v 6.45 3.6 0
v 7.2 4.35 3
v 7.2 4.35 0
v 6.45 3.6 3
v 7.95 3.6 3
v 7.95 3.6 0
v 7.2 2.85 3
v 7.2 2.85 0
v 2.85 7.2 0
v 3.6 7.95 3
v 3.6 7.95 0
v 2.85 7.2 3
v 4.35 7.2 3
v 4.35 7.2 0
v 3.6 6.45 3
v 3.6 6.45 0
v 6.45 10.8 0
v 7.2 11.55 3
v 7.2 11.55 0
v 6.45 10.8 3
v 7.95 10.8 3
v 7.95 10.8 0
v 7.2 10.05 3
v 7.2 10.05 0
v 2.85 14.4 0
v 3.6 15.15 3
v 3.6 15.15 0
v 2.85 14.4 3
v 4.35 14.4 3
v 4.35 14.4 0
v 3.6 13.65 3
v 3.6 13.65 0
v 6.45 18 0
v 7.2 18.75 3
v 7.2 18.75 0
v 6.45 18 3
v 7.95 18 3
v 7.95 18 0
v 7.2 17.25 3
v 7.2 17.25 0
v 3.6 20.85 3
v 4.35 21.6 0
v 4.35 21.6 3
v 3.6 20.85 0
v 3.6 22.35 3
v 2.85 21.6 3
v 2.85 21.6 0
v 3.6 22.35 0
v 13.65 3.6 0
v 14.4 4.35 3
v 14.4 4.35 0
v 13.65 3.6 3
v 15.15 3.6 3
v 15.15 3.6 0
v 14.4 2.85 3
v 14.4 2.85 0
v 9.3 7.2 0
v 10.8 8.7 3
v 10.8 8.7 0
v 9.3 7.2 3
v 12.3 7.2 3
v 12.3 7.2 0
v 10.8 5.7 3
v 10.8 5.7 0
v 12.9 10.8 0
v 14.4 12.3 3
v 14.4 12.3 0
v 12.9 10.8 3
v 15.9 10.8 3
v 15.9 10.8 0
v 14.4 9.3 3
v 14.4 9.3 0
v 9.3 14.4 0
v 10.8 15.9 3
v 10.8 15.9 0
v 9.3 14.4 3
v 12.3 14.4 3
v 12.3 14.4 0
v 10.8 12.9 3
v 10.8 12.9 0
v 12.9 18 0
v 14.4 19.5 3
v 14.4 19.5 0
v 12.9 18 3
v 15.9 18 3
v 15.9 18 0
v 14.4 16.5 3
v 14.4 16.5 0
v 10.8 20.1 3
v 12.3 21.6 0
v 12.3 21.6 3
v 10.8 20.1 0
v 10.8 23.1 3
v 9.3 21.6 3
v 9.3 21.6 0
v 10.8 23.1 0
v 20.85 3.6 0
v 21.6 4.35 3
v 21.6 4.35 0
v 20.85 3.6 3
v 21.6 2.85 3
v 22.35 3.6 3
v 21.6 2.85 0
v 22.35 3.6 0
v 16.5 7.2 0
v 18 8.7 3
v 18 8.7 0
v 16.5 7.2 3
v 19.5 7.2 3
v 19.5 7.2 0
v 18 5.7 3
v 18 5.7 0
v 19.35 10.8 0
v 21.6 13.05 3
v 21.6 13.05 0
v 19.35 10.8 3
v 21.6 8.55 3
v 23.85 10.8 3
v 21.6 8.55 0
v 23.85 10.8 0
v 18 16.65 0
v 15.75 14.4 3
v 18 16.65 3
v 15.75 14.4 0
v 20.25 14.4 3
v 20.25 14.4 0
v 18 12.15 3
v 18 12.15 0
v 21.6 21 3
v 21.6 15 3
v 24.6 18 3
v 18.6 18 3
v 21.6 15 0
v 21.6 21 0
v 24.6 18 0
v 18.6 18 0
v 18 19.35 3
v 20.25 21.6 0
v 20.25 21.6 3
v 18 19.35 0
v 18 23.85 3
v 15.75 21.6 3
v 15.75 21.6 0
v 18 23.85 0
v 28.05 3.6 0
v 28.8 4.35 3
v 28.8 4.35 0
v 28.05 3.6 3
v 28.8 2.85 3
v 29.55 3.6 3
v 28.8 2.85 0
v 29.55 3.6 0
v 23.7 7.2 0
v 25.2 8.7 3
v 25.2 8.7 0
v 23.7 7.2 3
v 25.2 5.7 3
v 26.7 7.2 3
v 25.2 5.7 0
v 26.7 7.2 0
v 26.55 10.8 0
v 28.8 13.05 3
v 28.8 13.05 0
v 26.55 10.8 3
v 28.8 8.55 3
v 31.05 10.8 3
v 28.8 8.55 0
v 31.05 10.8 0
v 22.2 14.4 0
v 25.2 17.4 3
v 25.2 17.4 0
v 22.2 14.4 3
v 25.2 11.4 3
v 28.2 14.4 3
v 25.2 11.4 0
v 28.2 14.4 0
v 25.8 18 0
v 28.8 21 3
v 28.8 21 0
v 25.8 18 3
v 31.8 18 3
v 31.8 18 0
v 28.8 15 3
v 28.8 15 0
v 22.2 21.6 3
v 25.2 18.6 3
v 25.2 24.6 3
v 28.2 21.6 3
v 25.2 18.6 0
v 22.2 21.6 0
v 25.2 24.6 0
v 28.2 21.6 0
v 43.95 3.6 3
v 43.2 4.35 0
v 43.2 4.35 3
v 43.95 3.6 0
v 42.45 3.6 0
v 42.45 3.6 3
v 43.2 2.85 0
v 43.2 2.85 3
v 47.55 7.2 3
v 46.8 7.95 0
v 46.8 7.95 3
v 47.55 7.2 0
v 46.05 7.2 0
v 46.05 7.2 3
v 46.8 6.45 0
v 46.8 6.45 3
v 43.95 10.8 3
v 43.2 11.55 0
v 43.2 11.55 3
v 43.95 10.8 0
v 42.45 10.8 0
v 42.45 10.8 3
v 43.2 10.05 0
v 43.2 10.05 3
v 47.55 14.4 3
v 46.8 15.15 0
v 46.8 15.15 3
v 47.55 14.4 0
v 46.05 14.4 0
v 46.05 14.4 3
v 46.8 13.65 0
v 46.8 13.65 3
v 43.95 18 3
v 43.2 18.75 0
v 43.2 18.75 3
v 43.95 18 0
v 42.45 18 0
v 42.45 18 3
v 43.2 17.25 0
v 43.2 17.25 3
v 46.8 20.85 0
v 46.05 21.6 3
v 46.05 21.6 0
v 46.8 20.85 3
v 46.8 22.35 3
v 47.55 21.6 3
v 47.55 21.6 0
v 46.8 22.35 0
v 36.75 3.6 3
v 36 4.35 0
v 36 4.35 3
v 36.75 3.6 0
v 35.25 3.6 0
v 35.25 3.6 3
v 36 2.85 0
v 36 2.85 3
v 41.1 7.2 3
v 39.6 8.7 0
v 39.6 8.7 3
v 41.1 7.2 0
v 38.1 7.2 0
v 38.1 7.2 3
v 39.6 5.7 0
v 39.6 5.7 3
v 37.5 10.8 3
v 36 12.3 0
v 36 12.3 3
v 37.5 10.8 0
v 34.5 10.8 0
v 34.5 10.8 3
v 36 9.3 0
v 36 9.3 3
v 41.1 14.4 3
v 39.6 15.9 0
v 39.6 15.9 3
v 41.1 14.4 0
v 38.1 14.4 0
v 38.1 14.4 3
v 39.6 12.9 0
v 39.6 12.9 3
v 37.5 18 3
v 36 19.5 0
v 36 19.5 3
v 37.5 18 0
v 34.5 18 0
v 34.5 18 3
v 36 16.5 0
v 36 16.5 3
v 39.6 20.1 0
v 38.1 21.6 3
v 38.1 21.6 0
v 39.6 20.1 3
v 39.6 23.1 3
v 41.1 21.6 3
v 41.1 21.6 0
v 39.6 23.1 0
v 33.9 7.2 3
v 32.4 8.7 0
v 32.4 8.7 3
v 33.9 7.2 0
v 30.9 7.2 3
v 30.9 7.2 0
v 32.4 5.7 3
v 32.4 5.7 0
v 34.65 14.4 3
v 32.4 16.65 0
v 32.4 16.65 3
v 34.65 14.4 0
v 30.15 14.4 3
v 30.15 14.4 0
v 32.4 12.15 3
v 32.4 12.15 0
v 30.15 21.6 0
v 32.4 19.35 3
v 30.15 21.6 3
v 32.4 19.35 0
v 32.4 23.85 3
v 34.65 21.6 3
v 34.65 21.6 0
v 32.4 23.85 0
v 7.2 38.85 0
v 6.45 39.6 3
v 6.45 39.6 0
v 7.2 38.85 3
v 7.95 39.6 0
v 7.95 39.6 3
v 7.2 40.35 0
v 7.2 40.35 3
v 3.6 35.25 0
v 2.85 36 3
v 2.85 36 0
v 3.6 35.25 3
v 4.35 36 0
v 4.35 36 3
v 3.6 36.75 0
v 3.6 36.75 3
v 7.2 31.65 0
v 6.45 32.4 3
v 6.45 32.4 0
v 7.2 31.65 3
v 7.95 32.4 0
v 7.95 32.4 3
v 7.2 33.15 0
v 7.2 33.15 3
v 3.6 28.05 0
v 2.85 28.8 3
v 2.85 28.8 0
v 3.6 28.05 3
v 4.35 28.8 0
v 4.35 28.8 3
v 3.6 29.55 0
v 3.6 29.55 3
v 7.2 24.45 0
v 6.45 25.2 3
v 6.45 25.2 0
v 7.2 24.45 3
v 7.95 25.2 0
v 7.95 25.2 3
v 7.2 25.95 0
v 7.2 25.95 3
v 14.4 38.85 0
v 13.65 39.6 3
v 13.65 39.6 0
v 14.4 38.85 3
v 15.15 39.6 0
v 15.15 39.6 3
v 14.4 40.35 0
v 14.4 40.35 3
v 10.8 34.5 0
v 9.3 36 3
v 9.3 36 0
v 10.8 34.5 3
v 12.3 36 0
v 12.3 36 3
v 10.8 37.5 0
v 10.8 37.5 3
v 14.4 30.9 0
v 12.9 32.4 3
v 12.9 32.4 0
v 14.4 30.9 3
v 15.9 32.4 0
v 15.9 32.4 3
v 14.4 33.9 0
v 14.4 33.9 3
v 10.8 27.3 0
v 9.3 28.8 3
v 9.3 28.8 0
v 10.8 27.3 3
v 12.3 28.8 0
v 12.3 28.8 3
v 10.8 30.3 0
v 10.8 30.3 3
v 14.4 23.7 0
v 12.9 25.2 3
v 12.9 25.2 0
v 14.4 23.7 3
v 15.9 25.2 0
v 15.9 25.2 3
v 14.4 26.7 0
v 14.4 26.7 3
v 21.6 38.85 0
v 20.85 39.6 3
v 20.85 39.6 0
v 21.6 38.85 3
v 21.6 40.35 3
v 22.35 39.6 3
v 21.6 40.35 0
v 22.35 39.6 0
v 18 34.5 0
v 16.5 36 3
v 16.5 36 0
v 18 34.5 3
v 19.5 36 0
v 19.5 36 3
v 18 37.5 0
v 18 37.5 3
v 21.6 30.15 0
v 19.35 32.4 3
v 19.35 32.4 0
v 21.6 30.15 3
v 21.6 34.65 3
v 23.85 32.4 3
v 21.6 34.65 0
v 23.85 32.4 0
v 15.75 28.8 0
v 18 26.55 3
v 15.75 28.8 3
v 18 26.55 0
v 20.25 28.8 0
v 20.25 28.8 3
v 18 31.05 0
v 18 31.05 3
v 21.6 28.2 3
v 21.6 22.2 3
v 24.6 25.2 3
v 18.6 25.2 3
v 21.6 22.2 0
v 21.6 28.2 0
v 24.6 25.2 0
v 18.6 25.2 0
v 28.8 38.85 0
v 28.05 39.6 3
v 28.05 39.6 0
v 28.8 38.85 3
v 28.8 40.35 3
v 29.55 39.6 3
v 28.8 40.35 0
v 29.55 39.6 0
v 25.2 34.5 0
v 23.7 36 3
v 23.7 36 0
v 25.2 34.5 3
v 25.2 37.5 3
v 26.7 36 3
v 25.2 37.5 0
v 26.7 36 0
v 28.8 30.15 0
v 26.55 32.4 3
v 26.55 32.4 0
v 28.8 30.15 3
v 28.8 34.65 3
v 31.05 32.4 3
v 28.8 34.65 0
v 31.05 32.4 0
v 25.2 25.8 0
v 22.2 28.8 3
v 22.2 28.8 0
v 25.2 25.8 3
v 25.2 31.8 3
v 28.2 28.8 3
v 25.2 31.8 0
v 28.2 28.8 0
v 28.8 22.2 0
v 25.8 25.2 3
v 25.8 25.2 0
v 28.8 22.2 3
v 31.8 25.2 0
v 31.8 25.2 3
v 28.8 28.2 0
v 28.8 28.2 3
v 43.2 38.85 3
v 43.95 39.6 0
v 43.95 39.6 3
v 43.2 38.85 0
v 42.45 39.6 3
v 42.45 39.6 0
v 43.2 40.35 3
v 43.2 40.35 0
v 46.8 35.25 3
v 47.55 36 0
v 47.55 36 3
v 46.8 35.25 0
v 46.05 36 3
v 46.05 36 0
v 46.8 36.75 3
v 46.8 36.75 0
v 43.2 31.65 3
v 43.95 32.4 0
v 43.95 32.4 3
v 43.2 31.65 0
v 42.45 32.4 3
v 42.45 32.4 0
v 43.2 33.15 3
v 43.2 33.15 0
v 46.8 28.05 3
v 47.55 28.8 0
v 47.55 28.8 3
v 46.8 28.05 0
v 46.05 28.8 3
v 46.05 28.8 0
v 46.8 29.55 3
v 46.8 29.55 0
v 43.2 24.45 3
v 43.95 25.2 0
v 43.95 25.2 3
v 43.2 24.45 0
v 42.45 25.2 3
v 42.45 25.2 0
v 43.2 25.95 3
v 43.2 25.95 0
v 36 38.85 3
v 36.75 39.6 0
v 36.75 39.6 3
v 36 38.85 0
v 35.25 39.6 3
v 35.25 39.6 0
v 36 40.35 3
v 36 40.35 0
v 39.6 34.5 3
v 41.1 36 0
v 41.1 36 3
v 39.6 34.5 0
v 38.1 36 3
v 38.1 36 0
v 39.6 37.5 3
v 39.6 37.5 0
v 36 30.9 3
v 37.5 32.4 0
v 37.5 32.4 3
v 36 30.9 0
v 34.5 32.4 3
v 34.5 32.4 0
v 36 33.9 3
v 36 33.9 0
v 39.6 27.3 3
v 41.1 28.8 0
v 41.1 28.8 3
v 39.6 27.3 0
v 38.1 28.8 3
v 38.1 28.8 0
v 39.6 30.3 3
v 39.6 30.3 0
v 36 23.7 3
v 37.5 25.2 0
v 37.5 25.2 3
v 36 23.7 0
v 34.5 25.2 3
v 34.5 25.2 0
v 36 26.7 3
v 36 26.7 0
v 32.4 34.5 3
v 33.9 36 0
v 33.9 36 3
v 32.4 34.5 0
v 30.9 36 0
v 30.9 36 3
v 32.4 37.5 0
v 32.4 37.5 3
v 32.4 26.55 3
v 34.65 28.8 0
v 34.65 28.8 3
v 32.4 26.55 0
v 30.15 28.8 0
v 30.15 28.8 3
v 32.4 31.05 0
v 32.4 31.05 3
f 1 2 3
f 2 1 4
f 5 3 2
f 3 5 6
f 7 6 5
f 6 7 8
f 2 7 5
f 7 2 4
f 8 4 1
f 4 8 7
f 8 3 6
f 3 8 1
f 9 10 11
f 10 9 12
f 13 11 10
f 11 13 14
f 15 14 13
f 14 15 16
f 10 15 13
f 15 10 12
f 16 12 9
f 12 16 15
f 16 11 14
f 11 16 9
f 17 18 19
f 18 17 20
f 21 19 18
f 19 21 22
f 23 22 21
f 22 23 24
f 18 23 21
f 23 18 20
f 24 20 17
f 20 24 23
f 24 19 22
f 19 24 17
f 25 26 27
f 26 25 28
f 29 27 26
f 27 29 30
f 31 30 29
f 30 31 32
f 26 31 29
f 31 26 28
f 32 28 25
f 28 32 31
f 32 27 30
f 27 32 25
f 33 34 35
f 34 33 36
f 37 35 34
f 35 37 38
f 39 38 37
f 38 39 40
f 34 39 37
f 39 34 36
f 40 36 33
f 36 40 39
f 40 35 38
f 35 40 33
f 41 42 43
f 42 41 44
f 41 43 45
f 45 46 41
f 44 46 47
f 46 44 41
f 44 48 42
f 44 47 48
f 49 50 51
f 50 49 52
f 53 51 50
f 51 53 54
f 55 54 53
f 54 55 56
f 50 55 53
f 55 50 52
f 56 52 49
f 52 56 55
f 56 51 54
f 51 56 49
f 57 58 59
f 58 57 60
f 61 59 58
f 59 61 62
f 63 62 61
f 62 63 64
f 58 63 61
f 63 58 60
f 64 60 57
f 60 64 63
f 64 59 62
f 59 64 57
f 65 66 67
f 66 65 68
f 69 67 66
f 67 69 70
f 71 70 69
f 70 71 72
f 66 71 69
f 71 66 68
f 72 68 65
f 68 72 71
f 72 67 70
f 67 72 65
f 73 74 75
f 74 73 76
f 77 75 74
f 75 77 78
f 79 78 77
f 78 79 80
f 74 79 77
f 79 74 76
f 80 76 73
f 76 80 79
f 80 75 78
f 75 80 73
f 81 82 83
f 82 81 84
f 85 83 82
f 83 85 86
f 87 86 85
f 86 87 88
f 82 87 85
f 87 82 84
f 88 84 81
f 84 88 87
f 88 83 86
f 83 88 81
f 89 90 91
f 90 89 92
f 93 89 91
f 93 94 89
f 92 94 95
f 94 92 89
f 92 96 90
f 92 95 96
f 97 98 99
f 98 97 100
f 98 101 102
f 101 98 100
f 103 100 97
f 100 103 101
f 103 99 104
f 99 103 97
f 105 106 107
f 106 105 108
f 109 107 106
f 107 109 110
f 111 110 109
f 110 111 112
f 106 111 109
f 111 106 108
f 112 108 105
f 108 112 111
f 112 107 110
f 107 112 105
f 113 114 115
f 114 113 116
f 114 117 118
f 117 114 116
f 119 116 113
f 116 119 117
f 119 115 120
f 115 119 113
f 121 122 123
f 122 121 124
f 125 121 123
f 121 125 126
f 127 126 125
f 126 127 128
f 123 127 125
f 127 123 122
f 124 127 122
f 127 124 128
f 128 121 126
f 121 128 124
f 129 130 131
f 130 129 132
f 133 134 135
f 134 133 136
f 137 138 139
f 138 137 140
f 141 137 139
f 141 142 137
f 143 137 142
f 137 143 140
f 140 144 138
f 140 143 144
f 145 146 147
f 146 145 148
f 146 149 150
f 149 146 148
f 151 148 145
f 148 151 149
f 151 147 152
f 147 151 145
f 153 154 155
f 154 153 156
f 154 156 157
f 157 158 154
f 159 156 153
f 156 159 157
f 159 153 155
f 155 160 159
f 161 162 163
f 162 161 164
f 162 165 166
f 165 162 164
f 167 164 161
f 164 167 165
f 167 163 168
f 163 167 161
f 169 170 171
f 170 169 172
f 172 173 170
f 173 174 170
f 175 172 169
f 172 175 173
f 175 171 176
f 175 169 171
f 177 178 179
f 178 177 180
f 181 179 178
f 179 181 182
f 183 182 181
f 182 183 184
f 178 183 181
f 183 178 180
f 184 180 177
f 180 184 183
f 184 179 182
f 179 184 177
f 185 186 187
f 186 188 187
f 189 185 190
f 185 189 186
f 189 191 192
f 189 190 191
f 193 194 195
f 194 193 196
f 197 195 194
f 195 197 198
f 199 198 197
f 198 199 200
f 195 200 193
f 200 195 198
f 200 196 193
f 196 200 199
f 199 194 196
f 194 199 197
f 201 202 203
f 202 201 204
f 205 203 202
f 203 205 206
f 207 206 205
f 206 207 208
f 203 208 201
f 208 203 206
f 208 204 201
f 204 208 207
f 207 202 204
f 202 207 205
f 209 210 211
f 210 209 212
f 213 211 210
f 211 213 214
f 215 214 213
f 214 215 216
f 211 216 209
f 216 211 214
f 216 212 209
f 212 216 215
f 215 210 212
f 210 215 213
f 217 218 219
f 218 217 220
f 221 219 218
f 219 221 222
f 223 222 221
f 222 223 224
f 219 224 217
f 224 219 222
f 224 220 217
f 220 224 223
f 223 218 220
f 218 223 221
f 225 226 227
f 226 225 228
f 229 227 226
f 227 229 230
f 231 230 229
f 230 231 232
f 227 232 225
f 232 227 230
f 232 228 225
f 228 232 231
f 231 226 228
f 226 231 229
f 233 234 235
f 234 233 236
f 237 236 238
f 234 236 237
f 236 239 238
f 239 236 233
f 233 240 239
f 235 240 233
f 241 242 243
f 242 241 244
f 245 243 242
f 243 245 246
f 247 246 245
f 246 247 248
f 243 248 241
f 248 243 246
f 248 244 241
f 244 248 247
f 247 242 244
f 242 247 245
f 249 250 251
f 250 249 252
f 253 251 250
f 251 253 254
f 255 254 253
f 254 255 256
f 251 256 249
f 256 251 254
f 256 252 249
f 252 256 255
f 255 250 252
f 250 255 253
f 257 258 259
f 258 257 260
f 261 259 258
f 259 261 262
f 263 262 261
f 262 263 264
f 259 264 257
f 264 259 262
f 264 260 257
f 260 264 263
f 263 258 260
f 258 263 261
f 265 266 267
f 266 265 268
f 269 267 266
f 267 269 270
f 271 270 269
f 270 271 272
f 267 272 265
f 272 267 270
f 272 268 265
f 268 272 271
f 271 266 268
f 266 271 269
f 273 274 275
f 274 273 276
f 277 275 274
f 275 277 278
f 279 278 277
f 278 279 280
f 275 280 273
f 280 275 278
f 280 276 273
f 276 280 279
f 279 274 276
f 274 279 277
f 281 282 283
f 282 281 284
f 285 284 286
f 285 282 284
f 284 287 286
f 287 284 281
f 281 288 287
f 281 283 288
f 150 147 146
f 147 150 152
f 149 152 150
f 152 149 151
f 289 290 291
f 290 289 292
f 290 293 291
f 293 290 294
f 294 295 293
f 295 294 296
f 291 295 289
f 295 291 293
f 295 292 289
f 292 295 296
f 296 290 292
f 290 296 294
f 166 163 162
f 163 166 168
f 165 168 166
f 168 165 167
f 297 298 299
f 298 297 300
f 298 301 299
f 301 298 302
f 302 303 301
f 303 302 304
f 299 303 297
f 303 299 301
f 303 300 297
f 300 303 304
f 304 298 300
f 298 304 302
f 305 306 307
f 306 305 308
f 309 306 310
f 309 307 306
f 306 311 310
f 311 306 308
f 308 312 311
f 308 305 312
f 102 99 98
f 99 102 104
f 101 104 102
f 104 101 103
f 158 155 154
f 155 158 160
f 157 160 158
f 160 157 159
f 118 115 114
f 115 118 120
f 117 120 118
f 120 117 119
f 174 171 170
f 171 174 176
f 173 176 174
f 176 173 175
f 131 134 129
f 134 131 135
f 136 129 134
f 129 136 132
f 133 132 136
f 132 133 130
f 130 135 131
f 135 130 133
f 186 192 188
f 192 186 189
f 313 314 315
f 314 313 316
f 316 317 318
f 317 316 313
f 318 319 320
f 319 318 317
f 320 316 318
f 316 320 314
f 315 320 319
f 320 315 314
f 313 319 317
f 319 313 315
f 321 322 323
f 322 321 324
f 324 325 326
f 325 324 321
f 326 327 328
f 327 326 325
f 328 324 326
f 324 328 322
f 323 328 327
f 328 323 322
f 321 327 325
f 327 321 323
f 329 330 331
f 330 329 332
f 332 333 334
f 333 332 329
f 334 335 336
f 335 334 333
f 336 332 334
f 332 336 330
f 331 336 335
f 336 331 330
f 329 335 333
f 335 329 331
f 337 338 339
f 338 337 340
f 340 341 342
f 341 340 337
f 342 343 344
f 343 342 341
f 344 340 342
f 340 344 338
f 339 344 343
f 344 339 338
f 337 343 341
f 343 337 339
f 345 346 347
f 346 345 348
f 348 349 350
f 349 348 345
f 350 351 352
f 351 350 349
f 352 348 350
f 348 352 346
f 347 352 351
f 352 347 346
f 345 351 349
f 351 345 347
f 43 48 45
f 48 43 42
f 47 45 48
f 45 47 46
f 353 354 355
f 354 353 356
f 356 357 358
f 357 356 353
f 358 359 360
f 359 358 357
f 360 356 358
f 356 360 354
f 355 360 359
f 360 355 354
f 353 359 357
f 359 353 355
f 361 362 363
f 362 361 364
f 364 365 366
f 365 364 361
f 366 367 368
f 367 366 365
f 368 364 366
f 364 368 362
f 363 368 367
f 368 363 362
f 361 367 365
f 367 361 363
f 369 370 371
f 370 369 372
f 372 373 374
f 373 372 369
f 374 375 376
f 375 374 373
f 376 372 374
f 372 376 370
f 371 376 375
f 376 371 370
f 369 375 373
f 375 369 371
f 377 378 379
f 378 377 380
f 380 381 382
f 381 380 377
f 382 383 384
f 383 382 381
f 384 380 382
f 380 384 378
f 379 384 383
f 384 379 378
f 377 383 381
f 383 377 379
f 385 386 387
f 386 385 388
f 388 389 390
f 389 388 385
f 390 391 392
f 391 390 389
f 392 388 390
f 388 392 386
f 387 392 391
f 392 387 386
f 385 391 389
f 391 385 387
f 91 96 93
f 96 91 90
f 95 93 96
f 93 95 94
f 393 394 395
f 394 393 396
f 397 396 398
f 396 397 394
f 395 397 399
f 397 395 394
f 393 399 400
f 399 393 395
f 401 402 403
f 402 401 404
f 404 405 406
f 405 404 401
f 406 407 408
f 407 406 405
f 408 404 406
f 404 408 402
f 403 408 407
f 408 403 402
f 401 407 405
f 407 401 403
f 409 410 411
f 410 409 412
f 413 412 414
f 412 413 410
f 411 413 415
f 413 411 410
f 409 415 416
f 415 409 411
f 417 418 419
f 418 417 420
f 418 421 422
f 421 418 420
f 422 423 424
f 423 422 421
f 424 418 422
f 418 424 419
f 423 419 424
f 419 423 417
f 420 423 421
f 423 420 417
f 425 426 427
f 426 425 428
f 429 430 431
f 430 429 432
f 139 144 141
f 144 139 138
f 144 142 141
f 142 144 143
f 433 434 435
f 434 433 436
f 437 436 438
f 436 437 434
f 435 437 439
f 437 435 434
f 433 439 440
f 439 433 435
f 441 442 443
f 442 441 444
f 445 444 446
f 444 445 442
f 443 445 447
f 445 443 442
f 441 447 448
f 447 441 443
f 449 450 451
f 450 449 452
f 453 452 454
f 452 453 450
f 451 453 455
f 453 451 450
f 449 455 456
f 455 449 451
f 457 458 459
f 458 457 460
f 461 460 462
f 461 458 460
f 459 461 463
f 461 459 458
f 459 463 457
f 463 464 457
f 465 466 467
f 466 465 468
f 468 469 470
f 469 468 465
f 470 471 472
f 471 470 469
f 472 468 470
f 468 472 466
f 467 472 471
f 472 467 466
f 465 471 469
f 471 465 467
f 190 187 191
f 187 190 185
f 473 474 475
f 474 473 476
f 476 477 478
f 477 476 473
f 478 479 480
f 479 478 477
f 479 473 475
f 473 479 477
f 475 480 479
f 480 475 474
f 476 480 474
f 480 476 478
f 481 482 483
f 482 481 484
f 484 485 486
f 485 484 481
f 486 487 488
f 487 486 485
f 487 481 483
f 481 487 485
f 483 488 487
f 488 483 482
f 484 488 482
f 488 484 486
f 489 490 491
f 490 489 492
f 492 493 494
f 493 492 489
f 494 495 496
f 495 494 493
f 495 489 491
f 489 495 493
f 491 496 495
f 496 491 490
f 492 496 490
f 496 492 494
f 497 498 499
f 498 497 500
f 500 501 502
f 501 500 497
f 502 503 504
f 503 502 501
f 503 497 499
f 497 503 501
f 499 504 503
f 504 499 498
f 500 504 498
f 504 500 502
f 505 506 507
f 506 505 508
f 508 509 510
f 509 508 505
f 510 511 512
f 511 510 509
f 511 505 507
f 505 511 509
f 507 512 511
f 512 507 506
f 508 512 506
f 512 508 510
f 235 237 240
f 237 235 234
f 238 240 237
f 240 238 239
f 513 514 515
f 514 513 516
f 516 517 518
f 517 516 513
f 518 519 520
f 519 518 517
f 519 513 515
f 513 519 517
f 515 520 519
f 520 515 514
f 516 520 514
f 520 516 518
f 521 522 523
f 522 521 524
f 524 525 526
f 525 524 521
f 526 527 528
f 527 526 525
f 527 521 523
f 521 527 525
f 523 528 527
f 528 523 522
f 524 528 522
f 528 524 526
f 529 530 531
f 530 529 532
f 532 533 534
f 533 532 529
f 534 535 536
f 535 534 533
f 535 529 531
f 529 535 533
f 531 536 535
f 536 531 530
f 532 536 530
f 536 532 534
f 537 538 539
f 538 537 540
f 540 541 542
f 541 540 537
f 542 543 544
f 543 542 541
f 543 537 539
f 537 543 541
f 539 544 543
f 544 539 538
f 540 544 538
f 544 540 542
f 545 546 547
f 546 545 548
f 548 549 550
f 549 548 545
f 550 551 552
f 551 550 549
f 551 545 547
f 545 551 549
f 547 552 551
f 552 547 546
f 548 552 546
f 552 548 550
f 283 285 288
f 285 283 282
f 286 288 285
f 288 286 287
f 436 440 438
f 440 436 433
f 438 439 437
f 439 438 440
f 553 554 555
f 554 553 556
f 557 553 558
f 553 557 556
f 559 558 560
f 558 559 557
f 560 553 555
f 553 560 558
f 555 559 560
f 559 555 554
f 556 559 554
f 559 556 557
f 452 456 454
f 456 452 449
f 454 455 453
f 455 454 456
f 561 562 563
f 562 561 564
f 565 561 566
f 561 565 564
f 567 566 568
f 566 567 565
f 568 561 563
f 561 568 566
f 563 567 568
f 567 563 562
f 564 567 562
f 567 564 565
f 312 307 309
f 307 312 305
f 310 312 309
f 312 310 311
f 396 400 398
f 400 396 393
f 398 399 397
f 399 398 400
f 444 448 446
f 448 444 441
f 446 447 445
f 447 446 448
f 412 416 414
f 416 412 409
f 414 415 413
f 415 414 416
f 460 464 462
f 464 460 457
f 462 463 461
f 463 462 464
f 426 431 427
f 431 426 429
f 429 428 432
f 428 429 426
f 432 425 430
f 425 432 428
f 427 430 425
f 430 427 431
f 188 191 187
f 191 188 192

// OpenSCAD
// parameters
NUM_X = 4;
NUM_Y = 6;
H = 3;
R_HOLE_MAX = 3;

module DiamondColumnsCorner(num_x, num_y, h, r_hole_max) {
    num_min = min(num_x, num_y);
    for ( i = [1 : num_x] ) {
        for ( j = [1 : num_y] ) {
            r = r_hole_max * (1.0/num_min)*min(i, j);
            if (r > r_hole_max) {
                r = r_hole_max;
            }
            translate([r_hole_max*1.2*2*i+(j%2)*r_hole_max*1.2, r_hole_max*1.2*j, 0])
                cylinder(r=r, h=h, $fn=4);
        }
    }
}

module DiamondColumns(num_x, num_y, h, r_hole_max) {
    translate([-r_hole_max*1.2, 0, 0]) {
        DiamondColumnsCorner(num_x, num_y, h, r_hole_max);

        translate([r_hole_max*1.2*num_x*2*2, 0, 0])
            mirror([1, 0, 0])
                DiamondColumnsCorner(num_x, num_y, h, r_hole_max);

        translate([0, r_hole_max*1.2*num_y*2, 0])
            mirror([0, 1, 0])
                DiamondColumnsCorner(num_x, num_y, h, r_hole_max);

        translate([r_hole_max*1.2*num_x*2*2, r_hole_max*1.2*num_y*2, 0])
            mirror([1, 0, 0])
                mirror([0, 1, 0])
                    DiamondColumnsCorner(num_x, num_y, h, r_hole_max);

    }
}

// main
DiamondColumns(num_x=NUM_X, num_y=NUM_Y, h=H, r_hole_max=R_HOLE_MAX);
